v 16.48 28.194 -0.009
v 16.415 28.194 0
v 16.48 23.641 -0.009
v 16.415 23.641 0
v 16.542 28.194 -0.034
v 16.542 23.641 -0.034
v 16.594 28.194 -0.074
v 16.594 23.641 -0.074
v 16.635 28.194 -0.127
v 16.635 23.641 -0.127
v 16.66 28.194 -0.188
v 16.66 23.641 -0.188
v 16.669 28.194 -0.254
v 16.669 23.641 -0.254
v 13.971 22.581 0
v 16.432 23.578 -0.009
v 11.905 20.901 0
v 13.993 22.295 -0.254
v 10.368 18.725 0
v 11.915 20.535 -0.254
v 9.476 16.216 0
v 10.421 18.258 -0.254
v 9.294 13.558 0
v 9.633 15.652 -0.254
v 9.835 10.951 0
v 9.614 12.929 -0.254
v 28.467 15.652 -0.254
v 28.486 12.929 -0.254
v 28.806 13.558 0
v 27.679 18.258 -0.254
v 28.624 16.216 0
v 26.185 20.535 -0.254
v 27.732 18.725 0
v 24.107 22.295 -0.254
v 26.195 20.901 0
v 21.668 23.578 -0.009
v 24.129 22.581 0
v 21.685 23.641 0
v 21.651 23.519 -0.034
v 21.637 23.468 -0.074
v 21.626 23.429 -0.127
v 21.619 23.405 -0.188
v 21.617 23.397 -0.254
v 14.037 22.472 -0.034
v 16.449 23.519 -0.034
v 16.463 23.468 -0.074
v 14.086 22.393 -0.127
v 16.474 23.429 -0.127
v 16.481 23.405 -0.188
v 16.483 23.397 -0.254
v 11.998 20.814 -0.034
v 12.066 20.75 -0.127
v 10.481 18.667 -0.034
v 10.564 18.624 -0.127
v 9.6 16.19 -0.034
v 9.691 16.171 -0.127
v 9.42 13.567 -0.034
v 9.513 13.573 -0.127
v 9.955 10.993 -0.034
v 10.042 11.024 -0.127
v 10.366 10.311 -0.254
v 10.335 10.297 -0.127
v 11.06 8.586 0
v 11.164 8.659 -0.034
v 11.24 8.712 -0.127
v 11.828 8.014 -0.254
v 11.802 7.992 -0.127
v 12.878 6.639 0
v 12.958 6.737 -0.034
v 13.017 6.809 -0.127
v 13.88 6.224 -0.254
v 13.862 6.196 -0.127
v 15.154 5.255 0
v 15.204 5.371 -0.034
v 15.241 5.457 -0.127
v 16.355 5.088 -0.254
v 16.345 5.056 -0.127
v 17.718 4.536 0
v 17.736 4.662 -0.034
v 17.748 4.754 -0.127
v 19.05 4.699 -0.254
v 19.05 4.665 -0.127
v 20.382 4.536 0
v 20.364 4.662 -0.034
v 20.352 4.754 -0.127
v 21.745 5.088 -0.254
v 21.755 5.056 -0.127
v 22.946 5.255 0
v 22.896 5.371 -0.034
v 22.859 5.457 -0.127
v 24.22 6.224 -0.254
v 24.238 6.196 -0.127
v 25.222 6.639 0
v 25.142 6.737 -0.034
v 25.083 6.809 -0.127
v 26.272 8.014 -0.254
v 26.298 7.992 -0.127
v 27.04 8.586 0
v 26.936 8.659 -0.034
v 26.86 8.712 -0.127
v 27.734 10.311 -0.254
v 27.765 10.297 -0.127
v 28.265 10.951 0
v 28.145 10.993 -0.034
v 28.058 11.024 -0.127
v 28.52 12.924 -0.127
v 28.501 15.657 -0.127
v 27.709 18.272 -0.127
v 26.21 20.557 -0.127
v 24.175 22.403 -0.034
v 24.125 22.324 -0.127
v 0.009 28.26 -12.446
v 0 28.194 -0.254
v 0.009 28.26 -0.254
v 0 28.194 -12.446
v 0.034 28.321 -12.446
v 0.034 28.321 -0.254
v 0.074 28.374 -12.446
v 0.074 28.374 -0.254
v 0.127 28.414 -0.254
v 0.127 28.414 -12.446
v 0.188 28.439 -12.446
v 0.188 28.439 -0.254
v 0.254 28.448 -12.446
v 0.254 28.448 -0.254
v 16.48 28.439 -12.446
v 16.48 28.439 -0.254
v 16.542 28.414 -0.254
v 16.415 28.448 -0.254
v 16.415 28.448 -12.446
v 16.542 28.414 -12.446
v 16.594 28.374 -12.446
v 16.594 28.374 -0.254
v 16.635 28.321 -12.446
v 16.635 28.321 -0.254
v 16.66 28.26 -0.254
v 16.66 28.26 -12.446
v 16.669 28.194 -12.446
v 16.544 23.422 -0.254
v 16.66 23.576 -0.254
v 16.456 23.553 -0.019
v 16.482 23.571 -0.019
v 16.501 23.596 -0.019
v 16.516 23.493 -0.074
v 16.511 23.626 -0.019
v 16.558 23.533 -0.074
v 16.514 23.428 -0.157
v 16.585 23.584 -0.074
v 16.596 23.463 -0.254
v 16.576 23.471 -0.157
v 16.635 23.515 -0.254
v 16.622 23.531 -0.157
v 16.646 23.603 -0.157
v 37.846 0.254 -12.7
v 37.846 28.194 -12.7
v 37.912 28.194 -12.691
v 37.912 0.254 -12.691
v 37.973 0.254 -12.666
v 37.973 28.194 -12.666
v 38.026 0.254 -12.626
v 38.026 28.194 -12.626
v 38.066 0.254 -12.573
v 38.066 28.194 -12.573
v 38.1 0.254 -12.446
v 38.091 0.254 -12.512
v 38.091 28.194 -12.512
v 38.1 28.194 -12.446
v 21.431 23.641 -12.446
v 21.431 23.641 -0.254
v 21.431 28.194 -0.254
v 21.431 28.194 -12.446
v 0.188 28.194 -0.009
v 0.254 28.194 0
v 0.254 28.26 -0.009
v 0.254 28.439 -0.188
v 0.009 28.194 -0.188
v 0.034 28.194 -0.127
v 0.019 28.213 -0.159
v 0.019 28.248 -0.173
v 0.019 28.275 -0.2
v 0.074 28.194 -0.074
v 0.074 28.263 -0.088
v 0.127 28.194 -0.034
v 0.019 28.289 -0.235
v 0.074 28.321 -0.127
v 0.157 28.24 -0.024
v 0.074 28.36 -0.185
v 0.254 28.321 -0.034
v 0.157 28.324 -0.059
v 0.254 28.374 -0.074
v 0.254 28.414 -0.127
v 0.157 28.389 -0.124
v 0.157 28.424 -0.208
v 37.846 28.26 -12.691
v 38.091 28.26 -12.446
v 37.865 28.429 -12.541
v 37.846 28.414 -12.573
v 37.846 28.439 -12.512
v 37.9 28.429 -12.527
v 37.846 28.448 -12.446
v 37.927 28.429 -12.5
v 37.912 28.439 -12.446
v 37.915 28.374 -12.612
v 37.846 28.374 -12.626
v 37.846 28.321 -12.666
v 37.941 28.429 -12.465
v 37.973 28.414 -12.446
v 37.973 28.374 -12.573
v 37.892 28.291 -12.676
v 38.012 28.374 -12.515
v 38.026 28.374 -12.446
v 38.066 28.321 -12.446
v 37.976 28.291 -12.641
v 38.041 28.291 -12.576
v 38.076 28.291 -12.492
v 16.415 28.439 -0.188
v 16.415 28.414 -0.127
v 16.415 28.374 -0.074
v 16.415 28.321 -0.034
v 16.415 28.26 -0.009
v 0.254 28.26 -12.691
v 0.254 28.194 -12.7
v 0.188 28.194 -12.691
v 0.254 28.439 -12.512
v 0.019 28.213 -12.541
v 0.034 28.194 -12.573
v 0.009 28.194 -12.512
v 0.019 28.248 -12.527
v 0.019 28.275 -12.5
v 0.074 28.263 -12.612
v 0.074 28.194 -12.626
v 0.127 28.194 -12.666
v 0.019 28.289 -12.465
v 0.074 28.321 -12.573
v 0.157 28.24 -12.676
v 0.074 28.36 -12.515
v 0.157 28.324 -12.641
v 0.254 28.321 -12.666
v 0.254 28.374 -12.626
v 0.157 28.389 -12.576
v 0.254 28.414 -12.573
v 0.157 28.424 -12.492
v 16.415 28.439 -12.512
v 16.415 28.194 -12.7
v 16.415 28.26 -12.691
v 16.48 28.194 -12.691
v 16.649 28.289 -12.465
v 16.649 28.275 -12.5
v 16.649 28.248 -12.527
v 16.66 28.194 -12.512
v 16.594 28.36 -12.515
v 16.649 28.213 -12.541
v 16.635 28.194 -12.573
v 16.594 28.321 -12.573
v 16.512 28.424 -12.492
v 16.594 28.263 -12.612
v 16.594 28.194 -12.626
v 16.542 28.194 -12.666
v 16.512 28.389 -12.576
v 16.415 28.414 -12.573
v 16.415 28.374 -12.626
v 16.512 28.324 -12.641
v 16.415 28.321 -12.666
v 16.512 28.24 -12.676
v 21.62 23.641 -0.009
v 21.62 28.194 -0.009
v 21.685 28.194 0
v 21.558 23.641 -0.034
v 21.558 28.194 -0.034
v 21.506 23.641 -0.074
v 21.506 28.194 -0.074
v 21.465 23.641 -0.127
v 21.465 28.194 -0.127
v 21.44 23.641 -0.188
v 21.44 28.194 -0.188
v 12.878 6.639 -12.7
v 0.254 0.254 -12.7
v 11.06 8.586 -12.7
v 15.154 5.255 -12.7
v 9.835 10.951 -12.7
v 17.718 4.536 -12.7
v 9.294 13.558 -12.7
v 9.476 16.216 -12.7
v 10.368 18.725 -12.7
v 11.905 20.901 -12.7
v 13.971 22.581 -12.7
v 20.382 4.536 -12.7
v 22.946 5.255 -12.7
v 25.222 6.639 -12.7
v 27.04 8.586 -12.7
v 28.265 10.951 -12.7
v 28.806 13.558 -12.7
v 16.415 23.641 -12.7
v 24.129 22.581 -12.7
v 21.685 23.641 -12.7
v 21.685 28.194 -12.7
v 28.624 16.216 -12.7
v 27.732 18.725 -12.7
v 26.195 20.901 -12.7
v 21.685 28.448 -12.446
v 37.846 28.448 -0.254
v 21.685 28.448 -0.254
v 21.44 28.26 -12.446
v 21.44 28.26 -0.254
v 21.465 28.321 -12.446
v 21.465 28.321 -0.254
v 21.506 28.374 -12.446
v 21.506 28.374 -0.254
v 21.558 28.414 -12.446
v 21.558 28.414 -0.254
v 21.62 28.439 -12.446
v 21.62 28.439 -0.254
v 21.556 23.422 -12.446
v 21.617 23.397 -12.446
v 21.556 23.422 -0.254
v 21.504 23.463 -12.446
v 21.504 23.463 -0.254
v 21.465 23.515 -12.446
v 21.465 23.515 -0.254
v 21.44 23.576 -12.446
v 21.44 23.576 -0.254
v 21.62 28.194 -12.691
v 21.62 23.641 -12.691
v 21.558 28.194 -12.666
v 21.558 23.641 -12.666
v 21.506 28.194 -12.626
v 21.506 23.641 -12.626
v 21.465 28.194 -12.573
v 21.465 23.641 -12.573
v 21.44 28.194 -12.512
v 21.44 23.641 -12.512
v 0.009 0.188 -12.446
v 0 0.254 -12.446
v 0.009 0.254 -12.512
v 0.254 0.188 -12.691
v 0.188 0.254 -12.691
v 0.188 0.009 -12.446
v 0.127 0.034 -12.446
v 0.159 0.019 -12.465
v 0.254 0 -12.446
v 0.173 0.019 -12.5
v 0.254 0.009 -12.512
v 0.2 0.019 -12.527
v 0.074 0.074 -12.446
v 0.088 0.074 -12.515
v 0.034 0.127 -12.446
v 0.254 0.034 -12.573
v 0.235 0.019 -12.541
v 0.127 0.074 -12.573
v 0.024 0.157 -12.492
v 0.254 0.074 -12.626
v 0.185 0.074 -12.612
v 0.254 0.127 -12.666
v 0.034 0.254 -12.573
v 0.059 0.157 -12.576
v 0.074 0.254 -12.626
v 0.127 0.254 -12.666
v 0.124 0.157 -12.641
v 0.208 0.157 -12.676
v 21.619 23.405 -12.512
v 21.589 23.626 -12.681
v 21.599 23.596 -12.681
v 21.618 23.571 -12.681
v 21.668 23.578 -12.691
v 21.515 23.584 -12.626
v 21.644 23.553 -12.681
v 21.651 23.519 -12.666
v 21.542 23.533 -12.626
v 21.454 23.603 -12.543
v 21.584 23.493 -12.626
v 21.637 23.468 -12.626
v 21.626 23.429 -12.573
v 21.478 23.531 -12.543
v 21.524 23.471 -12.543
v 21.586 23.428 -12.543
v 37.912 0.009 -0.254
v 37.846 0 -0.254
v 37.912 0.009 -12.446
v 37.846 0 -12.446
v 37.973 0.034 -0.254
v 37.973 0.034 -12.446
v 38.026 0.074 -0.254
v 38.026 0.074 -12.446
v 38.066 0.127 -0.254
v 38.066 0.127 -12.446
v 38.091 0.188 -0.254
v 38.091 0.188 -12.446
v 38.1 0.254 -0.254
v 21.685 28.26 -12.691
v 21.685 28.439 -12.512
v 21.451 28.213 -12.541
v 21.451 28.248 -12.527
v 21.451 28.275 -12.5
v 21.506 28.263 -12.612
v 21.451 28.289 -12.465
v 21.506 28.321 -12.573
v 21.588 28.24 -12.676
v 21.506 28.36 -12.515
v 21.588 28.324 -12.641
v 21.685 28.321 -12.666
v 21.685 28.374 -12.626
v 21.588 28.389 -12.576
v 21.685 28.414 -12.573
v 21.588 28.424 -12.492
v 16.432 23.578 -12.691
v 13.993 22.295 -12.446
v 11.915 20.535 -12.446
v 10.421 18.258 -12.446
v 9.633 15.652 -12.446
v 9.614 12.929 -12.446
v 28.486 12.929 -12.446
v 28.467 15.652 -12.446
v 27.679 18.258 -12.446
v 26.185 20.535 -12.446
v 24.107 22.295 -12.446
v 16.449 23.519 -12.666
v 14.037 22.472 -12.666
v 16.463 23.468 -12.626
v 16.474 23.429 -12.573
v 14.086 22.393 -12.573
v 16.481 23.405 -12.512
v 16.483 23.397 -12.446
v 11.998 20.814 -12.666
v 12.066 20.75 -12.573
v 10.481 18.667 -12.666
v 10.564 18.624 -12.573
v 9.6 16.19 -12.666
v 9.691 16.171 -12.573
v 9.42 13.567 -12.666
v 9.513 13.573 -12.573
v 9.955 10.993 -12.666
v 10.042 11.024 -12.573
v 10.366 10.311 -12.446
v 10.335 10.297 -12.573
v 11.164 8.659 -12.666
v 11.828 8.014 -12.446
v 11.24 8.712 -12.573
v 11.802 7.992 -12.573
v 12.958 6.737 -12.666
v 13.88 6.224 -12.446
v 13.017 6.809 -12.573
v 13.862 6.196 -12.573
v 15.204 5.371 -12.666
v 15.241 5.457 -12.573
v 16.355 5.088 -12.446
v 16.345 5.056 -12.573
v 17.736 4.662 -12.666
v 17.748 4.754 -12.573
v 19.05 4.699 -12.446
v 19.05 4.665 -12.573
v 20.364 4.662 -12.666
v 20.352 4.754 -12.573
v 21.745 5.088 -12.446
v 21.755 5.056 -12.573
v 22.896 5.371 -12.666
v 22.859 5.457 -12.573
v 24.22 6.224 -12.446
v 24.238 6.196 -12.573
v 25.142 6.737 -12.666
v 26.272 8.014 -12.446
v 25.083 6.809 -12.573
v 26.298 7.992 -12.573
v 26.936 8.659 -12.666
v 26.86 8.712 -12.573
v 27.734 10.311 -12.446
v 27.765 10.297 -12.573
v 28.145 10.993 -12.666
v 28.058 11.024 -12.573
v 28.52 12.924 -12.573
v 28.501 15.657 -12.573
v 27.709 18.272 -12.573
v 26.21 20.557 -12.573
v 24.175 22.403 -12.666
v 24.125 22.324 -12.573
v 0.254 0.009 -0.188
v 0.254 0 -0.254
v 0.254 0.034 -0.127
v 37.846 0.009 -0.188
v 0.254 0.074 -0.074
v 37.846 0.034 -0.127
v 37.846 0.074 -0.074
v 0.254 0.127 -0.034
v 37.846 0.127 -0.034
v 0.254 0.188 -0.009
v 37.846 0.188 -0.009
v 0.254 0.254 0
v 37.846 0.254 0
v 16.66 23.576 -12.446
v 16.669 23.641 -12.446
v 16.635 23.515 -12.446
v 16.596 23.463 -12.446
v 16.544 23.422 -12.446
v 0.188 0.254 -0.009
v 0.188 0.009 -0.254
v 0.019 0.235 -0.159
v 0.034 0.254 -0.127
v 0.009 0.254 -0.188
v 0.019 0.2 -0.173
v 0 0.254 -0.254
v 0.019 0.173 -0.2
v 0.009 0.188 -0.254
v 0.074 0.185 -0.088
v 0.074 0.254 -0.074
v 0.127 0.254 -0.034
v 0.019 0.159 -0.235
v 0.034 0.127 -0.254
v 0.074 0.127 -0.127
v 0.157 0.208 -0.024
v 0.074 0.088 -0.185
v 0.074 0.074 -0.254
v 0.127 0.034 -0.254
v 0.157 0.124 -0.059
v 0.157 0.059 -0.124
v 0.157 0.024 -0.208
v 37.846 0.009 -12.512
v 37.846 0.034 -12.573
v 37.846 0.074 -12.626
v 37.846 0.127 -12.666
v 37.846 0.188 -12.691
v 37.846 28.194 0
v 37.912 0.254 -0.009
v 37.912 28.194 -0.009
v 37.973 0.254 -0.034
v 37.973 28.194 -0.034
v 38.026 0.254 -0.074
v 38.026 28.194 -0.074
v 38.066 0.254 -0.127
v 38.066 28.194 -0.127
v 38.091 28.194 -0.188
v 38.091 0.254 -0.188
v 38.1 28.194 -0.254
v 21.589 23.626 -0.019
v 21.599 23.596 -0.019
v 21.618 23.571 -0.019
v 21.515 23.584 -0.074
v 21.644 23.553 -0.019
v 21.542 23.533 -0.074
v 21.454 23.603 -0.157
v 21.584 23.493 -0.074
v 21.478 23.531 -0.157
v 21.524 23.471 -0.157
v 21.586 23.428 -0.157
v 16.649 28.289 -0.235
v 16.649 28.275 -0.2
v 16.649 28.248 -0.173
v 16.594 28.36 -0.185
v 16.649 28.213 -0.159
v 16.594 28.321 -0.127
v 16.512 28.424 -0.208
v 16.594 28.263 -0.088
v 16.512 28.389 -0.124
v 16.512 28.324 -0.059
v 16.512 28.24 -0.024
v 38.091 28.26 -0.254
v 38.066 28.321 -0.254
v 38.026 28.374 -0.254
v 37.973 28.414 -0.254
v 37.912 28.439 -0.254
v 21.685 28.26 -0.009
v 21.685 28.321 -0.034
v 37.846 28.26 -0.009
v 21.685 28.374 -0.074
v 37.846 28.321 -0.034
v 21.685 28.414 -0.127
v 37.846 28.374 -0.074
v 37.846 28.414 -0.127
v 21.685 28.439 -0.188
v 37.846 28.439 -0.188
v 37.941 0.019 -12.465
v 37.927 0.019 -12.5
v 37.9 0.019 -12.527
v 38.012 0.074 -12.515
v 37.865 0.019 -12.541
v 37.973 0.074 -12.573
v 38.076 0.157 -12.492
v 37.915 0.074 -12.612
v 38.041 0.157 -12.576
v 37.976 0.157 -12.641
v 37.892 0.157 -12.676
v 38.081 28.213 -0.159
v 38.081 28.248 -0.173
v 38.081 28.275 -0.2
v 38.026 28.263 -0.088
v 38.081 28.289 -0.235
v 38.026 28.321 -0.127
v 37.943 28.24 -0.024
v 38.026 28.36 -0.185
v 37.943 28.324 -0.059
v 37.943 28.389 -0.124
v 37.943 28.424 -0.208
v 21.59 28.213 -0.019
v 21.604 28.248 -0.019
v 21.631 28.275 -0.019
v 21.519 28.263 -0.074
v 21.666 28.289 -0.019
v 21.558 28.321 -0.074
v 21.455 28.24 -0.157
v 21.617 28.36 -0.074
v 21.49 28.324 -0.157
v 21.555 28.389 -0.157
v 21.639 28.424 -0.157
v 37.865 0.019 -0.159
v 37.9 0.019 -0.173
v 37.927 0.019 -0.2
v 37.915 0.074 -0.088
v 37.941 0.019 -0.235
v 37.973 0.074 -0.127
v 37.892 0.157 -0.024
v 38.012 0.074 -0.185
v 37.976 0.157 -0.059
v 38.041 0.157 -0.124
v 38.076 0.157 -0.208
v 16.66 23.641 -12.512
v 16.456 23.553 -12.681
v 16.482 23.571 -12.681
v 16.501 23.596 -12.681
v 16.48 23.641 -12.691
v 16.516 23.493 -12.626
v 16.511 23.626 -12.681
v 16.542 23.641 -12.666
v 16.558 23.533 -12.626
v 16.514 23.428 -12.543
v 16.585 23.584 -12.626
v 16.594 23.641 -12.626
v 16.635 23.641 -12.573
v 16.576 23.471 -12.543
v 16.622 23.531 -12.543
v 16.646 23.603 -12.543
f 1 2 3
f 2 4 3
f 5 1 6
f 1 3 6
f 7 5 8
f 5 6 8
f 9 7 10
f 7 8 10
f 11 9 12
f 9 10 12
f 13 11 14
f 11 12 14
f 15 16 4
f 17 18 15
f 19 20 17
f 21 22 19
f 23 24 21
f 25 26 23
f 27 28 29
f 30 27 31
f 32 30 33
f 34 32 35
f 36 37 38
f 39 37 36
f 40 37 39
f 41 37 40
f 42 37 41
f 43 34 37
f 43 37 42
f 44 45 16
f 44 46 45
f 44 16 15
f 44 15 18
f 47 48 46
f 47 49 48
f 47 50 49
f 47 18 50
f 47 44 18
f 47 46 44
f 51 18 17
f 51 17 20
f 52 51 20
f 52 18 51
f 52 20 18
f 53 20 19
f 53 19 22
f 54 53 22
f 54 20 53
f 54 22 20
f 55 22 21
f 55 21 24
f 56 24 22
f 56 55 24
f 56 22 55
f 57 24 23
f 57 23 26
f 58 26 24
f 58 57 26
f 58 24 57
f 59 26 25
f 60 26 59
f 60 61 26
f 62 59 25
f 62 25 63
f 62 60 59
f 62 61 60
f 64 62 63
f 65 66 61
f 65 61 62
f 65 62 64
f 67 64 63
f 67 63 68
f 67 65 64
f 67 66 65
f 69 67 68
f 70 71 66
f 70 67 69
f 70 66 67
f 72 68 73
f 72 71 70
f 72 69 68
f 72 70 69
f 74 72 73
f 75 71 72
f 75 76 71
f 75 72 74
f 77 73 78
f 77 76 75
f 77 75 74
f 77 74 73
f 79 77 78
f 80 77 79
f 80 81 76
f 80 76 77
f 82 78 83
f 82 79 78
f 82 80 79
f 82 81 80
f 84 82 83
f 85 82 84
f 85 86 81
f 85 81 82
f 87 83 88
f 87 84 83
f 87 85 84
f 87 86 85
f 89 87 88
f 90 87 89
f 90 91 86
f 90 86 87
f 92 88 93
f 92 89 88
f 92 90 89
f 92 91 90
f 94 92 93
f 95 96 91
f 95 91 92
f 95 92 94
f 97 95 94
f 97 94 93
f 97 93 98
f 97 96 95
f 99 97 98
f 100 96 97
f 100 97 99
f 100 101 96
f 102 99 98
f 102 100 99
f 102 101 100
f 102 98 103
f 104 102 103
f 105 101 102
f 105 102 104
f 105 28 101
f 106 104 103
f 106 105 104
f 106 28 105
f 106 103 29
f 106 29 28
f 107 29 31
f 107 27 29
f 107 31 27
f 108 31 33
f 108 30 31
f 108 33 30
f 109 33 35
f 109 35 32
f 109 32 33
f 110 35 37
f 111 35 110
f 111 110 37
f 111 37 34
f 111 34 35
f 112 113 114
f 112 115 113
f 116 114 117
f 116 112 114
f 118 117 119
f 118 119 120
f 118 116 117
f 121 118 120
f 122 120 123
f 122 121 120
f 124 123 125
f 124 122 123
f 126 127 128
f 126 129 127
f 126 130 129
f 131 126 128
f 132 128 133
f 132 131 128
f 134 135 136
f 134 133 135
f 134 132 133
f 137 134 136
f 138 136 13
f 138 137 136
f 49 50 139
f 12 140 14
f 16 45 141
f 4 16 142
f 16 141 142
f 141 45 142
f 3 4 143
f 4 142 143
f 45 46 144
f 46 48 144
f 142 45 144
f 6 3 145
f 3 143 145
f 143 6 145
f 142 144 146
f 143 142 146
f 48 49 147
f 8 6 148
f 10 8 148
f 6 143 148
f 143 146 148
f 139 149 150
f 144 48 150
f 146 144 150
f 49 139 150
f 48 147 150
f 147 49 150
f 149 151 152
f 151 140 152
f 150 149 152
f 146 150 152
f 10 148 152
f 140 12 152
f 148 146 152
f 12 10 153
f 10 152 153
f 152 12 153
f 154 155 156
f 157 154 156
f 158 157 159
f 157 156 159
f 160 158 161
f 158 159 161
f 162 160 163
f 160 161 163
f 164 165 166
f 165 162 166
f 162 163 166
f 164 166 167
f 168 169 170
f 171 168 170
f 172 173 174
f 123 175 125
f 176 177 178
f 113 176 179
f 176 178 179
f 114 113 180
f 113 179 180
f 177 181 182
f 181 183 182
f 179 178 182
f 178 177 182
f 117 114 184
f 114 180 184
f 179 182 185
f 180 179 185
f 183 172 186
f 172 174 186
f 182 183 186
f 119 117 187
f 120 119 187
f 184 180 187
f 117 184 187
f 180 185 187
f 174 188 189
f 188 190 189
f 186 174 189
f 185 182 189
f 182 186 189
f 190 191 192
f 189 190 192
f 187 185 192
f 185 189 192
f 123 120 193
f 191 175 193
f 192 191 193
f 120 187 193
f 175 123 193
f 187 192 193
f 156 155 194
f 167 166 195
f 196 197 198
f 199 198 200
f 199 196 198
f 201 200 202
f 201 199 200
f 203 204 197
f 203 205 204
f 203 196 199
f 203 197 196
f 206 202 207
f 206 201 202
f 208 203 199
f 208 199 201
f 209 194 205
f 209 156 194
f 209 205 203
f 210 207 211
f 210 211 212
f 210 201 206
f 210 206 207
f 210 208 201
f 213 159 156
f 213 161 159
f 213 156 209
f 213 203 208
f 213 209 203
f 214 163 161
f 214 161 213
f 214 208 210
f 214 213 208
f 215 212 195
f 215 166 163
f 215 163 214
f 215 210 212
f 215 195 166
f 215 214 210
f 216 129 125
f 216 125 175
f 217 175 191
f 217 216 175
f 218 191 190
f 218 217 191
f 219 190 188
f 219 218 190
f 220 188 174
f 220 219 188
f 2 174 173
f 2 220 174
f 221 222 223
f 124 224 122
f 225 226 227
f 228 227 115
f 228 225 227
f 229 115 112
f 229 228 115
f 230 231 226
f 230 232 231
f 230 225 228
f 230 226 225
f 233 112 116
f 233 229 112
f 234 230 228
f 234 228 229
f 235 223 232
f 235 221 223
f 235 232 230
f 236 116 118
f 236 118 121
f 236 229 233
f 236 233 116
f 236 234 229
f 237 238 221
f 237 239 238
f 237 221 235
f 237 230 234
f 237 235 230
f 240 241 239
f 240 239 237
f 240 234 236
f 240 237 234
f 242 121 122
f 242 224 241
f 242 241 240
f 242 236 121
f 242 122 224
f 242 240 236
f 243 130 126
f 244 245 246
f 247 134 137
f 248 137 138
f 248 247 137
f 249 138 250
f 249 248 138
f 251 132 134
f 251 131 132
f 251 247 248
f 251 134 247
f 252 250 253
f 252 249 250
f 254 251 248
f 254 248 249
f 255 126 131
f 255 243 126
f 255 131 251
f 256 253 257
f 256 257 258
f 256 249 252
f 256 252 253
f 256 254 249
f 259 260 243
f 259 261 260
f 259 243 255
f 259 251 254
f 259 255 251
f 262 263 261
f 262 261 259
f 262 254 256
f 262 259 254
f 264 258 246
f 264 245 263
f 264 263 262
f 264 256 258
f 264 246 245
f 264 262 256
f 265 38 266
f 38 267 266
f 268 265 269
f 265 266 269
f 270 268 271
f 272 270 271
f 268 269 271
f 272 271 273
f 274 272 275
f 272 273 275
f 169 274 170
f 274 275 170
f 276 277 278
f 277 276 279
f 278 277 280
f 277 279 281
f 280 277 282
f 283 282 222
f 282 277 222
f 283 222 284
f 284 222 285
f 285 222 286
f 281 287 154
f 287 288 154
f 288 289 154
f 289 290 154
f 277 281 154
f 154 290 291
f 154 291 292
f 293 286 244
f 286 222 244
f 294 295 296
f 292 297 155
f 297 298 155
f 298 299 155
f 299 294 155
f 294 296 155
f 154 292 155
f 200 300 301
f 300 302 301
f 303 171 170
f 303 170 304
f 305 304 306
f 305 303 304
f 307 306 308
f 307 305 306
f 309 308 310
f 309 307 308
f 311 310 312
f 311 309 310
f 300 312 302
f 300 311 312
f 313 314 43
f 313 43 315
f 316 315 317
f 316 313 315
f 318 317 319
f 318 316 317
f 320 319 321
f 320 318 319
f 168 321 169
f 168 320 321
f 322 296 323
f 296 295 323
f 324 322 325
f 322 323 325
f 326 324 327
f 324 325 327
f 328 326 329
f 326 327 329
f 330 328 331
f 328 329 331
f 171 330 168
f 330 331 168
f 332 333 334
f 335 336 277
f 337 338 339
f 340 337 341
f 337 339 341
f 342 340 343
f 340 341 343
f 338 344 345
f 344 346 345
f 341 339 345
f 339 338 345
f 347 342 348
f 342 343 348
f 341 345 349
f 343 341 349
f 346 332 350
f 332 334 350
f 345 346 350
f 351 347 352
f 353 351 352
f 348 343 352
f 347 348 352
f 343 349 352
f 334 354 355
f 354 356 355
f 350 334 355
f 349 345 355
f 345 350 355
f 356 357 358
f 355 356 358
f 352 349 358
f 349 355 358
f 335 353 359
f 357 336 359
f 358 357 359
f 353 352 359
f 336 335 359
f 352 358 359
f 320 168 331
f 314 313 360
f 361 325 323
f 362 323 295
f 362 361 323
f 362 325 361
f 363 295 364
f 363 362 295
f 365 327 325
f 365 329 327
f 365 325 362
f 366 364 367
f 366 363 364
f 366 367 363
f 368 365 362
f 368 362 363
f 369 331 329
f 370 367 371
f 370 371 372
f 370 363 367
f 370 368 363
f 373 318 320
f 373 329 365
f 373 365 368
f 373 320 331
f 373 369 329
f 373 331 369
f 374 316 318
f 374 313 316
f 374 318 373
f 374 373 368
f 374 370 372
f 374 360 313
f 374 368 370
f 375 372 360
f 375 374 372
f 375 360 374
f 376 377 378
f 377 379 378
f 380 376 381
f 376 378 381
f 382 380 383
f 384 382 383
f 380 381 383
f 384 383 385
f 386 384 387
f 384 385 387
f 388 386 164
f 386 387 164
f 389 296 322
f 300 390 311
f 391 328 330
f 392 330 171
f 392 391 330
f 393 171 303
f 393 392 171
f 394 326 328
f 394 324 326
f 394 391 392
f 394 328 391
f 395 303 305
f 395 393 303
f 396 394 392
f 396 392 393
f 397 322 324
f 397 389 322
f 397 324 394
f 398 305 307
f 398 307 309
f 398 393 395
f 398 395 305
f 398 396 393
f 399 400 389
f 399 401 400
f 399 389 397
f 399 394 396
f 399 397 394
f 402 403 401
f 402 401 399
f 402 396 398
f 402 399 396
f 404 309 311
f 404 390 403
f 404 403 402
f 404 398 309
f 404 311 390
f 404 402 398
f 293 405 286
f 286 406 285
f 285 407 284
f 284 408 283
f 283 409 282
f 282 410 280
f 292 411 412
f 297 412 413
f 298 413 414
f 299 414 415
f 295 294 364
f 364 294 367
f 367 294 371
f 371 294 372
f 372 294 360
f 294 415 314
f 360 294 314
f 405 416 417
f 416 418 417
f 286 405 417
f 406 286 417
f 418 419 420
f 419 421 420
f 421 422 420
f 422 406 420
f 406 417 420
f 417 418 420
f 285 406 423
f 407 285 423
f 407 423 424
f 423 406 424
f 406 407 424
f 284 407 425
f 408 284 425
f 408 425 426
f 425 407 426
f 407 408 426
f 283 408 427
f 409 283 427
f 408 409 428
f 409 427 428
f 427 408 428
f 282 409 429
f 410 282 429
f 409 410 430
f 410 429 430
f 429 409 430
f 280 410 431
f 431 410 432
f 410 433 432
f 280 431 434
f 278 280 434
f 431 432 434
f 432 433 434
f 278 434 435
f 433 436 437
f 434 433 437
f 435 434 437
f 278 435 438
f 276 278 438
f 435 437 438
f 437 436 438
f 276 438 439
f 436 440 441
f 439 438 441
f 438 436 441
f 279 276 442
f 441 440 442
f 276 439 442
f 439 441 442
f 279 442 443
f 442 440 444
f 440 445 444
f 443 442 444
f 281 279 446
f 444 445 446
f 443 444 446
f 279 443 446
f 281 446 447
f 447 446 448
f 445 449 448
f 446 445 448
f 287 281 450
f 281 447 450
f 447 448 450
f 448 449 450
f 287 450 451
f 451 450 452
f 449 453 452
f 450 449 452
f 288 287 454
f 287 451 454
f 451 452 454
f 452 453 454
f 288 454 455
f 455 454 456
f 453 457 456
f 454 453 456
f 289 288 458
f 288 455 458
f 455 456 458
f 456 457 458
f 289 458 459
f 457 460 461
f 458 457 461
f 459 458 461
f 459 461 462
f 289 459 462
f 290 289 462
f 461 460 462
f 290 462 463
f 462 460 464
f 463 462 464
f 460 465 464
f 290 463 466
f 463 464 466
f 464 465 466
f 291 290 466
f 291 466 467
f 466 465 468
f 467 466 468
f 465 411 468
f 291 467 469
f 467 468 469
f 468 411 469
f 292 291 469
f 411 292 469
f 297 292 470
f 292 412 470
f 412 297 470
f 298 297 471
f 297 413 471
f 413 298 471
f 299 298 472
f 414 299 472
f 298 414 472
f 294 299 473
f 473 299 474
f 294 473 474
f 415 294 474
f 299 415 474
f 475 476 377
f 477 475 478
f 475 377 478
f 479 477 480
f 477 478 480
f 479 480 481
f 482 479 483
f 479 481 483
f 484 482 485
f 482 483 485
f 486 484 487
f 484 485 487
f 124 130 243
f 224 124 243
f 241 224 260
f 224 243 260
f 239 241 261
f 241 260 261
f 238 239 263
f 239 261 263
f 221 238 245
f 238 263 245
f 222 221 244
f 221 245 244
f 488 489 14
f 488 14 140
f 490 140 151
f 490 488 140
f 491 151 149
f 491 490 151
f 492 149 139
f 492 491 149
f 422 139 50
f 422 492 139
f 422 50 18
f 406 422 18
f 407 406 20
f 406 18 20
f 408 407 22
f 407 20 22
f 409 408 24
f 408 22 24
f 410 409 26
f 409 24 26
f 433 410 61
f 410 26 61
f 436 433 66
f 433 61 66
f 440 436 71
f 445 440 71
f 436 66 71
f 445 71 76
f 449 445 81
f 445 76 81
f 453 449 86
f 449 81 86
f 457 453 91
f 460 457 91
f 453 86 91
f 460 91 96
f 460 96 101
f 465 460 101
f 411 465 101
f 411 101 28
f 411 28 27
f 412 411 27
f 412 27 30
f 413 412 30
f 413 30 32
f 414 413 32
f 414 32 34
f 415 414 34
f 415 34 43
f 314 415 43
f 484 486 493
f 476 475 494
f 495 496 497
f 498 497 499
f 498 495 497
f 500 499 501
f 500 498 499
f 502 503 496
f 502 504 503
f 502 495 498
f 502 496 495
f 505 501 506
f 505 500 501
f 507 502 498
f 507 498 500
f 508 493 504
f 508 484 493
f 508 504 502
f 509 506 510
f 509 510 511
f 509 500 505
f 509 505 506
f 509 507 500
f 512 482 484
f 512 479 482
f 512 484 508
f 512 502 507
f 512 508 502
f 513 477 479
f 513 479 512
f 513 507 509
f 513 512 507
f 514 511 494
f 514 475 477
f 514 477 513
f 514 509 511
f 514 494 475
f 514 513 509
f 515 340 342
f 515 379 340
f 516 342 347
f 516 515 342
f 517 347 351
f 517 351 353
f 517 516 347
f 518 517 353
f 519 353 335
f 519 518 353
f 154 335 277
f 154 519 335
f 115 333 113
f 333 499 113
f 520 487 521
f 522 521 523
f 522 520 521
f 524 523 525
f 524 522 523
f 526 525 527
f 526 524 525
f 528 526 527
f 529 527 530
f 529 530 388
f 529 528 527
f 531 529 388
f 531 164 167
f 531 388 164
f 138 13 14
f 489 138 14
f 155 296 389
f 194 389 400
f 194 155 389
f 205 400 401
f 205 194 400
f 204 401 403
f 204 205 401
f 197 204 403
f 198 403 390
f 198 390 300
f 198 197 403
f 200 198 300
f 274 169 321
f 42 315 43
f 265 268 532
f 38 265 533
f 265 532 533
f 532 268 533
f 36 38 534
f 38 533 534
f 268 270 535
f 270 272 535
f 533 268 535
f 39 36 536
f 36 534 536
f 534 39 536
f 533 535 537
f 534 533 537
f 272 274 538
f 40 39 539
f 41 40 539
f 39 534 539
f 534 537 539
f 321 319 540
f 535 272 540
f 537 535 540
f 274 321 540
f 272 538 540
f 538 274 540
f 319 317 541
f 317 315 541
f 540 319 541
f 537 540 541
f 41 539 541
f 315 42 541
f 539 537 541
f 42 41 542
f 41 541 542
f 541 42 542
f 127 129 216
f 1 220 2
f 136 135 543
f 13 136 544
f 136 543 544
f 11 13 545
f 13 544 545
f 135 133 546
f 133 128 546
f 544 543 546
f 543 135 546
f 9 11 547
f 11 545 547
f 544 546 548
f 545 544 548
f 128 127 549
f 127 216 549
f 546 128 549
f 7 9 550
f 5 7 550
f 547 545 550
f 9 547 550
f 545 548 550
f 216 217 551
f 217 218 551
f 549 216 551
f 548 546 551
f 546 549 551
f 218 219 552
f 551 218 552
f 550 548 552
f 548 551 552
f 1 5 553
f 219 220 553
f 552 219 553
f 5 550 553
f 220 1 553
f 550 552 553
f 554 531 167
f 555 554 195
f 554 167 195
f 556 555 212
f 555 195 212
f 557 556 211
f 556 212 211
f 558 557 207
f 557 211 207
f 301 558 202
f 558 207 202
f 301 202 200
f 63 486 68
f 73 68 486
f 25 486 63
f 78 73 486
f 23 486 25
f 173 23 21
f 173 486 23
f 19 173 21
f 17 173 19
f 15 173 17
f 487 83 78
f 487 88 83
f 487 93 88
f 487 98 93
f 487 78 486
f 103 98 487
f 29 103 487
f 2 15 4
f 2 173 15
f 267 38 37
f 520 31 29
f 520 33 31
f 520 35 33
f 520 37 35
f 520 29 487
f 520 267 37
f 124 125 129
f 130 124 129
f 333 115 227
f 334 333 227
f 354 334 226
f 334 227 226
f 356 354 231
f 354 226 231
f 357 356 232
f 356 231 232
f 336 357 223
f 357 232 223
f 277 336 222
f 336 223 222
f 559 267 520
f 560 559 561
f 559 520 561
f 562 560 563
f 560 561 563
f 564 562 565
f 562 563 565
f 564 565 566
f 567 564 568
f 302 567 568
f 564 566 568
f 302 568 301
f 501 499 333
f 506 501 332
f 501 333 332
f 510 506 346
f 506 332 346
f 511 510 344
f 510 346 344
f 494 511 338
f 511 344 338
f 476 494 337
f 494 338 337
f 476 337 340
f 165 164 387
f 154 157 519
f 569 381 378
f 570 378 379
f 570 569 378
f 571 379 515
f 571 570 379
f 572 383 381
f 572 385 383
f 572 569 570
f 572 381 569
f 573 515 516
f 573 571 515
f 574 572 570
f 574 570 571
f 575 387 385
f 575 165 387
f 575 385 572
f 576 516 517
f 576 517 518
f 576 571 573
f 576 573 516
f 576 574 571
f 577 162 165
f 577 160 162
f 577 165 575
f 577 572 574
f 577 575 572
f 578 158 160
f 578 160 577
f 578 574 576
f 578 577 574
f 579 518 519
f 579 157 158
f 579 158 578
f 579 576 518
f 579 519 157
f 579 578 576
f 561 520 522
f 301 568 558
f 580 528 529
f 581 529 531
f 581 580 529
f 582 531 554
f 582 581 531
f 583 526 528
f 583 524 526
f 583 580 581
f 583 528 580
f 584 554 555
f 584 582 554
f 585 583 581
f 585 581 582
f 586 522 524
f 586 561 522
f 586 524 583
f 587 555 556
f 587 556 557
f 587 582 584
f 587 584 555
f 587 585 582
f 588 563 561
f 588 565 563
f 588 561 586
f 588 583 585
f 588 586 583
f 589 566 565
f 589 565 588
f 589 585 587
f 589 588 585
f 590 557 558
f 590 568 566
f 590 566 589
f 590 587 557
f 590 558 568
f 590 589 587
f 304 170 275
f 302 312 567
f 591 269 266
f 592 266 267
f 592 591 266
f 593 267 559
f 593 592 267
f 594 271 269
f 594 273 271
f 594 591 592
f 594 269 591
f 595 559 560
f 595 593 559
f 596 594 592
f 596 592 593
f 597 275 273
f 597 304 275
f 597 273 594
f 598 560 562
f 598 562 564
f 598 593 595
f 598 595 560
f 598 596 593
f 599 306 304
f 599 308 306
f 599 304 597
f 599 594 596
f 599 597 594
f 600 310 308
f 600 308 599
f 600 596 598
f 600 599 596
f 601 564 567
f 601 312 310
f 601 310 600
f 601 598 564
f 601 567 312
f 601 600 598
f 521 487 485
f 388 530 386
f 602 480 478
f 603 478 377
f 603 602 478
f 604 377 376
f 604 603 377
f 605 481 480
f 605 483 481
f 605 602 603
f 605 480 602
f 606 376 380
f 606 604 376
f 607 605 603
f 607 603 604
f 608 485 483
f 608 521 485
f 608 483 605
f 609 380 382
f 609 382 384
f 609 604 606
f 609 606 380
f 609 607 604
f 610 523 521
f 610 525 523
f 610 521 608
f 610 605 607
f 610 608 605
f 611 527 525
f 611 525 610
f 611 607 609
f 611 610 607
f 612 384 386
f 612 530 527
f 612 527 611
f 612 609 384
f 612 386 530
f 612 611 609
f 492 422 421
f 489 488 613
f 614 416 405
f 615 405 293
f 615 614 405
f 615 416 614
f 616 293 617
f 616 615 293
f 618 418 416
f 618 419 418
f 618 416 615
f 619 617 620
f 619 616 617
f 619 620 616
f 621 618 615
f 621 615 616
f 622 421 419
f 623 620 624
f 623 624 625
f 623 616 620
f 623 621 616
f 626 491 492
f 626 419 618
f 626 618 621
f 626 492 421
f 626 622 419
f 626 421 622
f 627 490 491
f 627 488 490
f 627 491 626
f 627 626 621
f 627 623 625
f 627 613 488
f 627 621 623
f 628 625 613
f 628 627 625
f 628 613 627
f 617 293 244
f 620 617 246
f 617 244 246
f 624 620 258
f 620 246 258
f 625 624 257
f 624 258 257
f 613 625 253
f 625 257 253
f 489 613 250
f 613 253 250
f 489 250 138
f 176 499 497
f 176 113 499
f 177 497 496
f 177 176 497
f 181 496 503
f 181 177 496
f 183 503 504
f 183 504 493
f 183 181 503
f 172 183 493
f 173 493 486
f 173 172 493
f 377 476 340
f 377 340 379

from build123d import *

# Parameters (mm, degrees)
SKETCH1_W           = 38.1
SKETCH1_H           = 28.448
BOSS_EXTRUDE1_DEPTH = 12.7
CUT_EXTRUDE2_REACH  = 14.7
FILLET1_R           = 0.254


with BuildPart() as part:
    # Sketch1 → Boss-Extrude1 (new body)
    with BuildSketch(Plane.XY):
        with Locations((19.05, 14.224)):
            Rectangle(SKETCH1_W, SKETCH1_H)
    extrude(amount=-BOSS_EXTRUDE1_DEPTH)

    # Sketch3 → Cut-Extrude2 (cut, up to next)
    with BuildSketch(Plane.XY, mode=Mode.PRIVATE) as cut_extrude2_sk1:
        with BuildLine():
            Line((16.66875, 28.448), (16.66875, 23.446541593))
            ThreePointArc((16.66875, 23.446541593), (19.05, 4.699), (21.43125, 23.446541593))
            Line((21.43125, 23.446541593), (21.43125, 28.448))
            Line((21.43125, 28.448), (16.66875, 28.448))
        make_face()
    cut_extrude2_tool1 = extrude(cut_extrude2_sk1.sketch, amount=-CUT_EXTRUDE2_REACH, mode=Mode.PRIVATE) & part.part
    add(cut_extrude2_tool1.solids().sort_by_distance((19.05, 15.101748, 0))[0], mode=Mode.SUBTRACT)

    # Fillet1
    fillet1_edges = [part.edges().sort_by_distance(p)[0] for p in [
        (38.1, 14.224, -12.7),
        (8.334375, 28.448, 0),
        (8.334375, 28.448, -12.7),
        (29.765625, 28.448, -12.7),
        (21.43125, 23.446541593, -6.35),
        (16.66875, 23.446541593, -6.35),
        (16.66875, 28.448, -6.35),
        (21.43125, 25.947270797, -12.7),
        (21.43125, 28.448, -6.35),
        (21.43125, 25.947270797, 0),
        (19.05, 4.699, 0),
        (16.66875, 25.947270797, 0),
        (19.05, 4.699, -12.7),
        (16.66875, 25.947270797, -12.7),
        (0, 14.224, -12.7),
        (29.765625, 28.448, 0),
        (38.1, 14.224, 0),
        (19.05, 0, 0),
        (0, 14.224, 0),
        (0, 28.448, -6.35),
        (38.1, 28.448, -6.35),
        (38.1, 0, -6.35),
        (0, 0, -6.35),
        (19.05, 0, -12.7),
    ]]
    fillet(fillet1_edges, radius=FILLET1_R)


solid = part.part
